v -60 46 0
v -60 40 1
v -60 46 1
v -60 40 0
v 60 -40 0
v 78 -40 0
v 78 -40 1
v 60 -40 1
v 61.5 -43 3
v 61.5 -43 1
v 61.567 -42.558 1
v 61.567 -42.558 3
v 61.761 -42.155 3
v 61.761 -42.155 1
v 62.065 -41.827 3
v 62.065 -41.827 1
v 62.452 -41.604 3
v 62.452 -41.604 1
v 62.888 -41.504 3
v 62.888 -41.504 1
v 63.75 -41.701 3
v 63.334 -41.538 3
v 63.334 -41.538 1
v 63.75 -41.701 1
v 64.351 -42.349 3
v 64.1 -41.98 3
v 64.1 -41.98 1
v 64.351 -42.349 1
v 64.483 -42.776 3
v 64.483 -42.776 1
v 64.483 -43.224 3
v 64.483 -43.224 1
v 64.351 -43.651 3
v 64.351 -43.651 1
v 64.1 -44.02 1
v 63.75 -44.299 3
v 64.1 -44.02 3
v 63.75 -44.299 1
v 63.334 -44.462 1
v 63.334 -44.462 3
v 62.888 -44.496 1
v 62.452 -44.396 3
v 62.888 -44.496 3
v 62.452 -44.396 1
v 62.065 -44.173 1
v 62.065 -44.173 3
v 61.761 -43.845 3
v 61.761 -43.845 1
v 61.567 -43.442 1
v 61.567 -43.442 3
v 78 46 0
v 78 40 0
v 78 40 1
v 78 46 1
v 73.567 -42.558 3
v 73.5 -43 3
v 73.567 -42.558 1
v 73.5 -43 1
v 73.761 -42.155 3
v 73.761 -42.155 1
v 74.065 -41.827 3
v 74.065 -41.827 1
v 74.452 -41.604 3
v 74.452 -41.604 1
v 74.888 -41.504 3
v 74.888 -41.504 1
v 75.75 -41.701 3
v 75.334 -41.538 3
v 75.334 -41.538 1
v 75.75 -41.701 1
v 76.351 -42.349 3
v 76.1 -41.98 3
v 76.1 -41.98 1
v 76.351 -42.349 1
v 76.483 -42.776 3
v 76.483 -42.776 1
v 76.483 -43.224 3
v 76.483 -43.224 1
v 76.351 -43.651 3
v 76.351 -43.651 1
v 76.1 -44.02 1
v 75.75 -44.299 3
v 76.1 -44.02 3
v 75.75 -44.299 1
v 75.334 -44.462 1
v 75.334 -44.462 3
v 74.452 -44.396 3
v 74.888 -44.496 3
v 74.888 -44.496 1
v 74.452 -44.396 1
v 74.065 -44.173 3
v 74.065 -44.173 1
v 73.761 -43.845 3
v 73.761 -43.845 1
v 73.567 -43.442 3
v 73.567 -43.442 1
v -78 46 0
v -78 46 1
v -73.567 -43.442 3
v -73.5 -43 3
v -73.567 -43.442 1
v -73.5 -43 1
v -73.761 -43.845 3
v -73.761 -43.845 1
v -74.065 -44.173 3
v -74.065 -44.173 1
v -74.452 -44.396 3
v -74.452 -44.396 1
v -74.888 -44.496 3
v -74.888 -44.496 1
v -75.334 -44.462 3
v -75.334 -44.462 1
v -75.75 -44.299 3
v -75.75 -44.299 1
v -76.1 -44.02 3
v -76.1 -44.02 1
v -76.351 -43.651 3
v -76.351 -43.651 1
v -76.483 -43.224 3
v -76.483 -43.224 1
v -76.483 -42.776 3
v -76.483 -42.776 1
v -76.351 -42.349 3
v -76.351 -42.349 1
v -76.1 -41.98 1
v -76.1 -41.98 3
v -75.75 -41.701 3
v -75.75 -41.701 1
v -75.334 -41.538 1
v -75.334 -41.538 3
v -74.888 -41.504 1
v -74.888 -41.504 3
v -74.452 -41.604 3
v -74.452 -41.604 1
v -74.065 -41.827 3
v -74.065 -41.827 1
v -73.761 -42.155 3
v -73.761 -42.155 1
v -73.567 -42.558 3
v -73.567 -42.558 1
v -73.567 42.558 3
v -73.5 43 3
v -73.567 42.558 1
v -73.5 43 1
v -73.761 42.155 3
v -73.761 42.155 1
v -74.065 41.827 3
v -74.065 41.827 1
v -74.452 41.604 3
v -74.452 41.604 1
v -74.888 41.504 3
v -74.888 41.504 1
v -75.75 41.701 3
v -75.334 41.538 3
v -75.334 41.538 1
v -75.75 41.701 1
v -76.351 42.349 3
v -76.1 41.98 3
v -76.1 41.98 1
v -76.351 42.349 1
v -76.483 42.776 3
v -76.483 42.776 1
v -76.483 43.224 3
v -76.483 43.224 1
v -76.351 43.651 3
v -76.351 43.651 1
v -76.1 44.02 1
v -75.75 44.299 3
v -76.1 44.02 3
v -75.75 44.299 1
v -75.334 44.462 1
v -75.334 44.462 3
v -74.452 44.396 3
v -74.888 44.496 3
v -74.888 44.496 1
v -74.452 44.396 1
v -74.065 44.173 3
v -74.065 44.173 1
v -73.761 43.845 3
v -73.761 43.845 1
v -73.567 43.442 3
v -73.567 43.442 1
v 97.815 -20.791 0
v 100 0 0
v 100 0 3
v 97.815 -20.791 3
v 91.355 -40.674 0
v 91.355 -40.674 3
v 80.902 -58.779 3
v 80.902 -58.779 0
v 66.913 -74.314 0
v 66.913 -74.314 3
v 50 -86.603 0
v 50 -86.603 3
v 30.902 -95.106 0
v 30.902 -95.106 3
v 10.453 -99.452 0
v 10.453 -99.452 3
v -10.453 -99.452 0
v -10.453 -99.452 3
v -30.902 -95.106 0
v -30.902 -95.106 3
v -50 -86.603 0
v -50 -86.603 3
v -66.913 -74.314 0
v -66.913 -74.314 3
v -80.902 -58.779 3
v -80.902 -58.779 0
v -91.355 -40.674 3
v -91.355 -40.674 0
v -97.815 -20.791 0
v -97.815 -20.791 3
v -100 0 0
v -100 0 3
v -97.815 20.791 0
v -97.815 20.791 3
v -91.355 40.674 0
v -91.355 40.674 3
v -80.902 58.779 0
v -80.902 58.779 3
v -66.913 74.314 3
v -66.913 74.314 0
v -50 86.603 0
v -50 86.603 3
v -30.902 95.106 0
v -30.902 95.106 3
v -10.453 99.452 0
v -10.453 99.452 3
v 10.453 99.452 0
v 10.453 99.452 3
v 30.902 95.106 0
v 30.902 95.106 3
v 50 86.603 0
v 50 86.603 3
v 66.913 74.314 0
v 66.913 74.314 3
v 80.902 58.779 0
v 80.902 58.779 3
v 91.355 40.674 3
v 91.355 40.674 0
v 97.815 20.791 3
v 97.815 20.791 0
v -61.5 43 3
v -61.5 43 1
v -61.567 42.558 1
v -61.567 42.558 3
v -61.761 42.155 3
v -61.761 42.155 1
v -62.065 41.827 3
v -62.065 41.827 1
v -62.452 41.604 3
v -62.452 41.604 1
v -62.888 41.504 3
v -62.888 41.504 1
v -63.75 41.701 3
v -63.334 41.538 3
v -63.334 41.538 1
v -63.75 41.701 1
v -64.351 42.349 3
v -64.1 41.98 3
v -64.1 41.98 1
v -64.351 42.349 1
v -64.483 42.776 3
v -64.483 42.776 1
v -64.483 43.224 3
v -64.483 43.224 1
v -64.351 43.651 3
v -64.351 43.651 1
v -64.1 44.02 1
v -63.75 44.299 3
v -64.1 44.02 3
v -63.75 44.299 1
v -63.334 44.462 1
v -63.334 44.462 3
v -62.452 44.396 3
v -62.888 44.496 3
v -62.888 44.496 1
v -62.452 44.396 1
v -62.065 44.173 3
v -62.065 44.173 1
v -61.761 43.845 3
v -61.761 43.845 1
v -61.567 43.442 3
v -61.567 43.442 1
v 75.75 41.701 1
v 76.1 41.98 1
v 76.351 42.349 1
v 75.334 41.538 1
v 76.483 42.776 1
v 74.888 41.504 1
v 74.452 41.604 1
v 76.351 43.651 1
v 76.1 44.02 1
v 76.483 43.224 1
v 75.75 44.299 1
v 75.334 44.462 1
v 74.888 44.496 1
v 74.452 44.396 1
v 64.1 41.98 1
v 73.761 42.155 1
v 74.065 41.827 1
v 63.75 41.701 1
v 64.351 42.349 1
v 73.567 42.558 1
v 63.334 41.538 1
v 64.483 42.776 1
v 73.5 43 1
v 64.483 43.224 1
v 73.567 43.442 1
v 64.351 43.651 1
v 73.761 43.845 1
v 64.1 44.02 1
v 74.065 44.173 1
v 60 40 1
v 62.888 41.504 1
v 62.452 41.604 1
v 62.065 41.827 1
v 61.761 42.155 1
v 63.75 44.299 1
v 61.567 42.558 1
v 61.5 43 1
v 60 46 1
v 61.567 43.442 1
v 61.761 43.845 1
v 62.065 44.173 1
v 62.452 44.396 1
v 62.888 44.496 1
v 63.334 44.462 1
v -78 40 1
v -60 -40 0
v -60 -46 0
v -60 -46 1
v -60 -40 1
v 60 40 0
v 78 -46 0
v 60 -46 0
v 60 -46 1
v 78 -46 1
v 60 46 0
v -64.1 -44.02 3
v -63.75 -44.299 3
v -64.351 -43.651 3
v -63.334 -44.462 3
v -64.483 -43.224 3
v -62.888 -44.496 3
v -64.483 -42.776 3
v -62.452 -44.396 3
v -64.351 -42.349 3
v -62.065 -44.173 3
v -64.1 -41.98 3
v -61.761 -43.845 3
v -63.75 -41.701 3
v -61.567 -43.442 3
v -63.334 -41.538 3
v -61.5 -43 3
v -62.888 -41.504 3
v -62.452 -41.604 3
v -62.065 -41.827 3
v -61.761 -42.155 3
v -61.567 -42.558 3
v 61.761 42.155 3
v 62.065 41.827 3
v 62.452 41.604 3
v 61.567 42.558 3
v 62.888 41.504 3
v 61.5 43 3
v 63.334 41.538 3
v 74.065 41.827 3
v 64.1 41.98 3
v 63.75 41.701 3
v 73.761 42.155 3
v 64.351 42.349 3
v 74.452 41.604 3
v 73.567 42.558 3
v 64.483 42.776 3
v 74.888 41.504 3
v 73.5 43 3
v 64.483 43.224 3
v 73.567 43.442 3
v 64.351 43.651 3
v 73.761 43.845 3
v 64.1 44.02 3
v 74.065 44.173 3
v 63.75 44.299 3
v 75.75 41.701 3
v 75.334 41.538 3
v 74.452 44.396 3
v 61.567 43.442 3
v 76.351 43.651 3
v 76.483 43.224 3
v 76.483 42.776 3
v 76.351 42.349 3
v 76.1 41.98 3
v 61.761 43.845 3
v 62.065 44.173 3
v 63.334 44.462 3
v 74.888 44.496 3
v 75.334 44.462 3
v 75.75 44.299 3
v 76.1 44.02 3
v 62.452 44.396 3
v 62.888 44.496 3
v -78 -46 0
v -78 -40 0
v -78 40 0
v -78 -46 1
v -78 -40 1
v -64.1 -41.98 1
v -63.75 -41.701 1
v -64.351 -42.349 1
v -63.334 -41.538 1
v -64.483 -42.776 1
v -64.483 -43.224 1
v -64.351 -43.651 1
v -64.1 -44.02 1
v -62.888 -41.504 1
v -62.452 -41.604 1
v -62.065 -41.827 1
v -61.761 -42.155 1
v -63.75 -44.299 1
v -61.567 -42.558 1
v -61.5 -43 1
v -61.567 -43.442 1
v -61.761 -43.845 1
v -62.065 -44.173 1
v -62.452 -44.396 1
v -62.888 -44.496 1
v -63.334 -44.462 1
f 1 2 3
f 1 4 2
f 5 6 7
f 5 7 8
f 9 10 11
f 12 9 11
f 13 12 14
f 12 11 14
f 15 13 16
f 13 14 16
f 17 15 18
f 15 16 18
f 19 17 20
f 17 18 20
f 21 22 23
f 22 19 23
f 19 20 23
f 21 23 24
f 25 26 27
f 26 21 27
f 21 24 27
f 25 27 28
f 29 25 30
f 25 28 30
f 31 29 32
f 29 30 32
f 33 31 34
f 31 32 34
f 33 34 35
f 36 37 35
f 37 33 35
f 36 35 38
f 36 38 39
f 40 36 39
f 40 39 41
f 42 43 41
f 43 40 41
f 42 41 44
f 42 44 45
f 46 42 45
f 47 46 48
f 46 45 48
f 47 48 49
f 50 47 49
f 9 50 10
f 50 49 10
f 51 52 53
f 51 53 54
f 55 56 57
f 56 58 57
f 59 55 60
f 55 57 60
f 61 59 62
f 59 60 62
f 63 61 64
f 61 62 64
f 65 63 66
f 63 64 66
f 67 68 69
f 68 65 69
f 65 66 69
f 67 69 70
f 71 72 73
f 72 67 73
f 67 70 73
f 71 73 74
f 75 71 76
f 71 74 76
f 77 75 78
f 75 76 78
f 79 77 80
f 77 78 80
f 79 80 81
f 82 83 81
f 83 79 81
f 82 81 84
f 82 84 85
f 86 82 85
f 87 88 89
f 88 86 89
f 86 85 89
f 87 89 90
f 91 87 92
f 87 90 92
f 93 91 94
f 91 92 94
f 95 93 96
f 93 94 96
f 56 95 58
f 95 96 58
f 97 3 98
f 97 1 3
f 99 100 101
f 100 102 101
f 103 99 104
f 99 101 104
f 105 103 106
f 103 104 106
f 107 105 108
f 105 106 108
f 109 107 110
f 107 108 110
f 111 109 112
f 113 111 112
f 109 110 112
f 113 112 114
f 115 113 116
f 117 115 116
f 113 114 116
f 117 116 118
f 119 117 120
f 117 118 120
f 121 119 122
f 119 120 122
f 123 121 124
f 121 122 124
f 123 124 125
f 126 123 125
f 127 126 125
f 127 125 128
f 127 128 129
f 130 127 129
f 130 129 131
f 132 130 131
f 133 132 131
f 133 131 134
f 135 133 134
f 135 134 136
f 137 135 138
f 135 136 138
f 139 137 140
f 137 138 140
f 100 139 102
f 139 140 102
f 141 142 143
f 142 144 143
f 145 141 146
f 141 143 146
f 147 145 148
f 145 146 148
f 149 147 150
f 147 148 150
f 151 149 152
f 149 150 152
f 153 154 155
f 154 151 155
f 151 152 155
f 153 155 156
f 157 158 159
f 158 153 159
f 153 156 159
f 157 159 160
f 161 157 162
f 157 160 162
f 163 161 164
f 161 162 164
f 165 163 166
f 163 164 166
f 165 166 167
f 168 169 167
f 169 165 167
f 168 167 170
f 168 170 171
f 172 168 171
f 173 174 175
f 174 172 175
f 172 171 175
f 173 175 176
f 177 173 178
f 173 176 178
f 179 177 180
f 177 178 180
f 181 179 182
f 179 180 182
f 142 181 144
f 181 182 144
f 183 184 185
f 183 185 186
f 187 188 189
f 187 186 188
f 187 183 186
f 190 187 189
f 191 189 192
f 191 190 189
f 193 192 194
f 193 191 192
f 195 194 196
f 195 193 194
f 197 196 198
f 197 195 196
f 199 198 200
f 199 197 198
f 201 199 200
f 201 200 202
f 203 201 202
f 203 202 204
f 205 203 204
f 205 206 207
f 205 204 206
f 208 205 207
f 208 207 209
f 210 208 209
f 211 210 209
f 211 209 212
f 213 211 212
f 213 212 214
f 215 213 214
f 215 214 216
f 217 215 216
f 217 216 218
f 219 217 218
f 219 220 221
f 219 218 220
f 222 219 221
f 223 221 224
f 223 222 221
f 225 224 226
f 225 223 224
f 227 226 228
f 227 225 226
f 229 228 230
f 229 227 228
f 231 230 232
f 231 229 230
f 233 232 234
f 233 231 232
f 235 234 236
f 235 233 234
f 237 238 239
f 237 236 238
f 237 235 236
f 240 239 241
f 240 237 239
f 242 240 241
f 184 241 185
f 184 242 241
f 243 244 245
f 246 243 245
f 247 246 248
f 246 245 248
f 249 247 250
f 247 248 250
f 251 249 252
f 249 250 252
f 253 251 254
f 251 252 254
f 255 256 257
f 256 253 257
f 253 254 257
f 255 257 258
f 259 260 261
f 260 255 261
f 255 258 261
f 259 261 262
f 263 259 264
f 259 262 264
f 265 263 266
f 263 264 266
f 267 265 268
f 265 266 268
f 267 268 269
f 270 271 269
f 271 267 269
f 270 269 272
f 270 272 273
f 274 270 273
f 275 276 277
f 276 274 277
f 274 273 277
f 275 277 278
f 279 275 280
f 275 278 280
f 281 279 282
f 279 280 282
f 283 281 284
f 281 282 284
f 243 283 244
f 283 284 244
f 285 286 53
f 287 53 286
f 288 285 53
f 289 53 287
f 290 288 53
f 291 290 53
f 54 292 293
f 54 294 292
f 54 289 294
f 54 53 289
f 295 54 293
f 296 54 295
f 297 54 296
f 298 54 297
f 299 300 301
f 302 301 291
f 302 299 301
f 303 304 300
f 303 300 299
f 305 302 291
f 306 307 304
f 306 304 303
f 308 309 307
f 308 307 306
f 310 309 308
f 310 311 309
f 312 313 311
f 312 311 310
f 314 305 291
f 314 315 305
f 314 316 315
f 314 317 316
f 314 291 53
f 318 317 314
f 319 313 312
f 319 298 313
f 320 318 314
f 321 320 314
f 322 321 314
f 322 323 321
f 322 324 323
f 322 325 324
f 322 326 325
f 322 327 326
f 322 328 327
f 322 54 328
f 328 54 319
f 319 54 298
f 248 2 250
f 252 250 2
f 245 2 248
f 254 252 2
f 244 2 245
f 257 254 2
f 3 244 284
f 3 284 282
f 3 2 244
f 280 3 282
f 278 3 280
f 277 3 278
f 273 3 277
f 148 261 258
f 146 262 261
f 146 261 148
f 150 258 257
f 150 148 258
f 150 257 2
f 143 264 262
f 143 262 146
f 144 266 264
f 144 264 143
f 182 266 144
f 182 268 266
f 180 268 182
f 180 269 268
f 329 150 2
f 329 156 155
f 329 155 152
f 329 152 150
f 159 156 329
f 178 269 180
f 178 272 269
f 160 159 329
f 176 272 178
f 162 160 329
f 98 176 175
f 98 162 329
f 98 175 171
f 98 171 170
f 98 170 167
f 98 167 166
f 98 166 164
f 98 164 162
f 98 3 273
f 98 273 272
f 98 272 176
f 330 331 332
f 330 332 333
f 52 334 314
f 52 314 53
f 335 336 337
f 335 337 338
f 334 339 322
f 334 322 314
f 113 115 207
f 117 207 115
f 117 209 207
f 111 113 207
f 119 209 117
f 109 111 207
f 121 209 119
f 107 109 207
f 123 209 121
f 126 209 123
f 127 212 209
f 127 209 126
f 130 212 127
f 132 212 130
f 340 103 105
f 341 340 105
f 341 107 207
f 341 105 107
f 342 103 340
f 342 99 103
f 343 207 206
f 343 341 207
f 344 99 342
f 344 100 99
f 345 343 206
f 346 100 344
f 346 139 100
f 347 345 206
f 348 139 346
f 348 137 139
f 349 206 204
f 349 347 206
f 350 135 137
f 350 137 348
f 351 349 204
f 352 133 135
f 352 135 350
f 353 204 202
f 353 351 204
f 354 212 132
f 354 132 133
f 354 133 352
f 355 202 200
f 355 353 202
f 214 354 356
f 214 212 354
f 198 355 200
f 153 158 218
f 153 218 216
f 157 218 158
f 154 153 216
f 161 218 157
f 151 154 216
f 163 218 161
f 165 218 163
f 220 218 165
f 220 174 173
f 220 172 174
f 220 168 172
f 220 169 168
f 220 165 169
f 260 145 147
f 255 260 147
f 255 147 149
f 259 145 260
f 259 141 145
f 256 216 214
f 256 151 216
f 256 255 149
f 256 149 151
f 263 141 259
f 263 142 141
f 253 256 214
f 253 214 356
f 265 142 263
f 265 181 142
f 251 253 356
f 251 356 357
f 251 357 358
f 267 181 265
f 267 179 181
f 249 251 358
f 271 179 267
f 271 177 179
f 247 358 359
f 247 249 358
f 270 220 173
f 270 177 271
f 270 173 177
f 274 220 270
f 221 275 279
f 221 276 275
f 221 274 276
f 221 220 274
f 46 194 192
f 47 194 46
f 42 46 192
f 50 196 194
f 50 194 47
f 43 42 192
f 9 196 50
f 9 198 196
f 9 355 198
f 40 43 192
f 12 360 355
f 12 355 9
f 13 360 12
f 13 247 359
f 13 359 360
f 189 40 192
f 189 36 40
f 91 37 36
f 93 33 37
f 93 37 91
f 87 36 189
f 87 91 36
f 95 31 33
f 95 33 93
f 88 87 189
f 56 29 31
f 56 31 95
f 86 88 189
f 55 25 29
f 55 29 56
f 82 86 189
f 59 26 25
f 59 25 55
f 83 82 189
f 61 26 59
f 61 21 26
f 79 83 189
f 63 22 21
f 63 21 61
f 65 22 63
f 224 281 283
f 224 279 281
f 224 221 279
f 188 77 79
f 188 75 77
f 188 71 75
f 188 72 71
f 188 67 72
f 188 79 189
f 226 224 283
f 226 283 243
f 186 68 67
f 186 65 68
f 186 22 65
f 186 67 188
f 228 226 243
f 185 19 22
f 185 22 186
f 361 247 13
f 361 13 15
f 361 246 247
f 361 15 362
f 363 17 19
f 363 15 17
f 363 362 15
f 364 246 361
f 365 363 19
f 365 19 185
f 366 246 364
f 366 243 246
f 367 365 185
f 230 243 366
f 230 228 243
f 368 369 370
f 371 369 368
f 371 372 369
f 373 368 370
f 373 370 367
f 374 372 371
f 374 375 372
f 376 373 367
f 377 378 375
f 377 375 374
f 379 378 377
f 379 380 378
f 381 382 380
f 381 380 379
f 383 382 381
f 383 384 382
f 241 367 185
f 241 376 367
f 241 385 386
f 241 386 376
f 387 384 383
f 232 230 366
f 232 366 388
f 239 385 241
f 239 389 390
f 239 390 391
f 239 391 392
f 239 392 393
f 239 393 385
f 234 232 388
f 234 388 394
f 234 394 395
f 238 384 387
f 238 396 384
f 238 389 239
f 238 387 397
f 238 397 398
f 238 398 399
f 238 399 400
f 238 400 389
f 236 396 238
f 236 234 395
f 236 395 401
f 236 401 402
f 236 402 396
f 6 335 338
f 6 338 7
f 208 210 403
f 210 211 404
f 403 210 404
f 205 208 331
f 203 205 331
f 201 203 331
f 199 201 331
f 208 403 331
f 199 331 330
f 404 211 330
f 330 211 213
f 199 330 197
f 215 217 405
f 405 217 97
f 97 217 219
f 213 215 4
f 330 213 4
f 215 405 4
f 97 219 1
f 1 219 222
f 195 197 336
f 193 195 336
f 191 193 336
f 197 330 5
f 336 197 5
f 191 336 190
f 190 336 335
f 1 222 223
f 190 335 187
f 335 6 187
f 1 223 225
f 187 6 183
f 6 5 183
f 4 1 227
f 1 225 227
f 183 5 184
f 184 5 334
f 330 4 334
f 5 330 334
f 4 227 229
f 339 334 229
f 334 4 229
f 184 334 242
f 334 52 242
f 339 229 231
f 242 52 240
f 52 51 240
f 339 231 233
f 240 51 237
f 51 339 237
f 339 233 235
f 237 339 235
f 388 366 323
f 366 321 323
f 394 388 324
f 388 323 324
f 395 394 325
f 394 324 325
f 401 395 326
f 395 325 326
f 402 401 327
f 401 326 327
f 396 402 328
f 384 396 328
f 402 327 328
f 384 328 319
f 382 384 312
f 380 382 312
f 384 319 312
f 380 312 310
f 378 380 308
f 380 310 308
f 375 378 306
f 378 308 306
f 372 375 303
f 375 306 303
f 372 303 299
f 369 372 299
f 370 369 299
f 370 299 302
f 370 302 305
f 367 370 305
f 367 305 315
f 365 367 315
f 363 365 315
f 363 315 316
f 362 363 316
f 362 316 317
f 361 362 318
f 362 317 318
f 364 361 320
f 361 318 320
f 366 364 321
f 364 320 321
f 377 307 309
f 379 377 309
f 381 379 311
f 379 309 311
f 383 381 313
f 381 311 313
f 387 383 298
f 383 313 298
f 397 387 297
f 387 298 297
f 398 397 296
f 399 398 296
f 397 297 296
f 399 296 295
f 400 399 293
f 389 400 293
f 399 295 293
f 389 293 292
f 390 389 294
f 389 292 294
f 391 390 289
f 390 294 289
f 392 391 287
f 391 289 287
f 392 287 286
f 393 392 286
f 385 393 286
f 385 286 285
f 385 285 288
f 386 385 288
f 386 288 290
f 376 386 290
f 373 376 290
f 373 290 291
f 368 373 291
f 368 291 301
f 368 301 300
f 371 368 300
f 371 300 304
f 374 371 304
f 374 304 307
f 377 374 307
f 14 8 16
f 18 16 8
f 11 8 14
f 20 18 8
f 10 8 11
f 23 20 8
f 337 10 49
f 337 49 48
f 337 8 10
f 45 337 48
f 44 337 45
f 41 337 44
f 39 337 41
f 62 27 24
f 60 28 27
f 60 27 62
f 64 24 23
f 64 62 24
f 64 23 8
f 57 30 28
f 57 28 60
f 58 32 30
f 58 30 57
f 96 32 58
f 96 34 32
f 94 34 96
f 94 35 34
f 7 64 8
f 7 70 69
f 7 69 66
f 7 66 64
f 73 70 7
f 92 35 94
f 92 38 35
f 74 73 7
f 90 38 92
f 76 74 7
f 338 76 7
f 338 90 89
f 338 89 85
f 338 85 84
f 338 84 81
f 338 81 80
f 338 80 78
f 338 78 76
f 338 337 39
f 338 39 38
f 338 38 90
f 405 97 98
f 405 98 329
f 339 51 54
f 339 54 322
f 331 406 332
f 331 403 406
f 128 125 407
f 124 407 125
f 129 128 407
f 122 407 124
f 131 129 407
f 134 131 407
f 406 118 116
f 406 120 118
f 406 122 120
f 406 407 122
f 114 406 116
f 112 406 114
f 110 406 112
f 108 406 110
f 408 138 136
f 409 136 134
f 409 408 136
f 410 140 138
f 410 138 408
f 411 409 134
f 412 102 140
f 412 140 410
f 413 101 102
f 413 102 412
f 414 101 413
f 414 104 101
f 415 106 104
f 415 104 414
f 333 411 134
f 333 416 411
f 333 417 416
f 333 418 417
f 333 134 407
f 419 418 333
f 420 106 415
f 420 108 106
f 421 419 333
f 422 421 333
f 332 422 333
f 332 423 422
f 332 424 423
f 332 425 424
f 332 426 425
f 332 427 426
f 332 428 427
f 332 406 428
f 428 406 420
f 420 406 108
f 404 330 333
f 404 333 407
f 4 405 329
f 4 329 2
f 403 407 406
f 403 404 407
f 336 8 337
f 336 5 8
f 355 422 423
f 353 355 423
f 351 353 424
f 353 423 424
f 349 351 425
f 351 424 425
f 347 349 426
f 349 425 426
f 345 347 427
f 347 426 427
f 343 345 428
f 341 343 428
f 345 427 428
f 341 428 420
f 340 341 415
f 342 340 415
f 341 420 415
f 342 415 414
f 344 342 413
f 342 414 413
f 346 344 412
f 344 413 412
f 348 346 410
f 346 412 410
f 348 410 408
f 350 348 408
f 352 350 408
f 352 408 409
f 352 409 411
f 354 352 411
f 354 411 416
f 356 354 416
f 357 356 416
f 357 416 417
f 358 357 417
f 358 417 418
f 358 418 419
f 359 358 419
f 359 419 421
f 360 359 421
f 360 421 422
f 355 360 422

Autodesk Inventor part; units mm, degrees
ref_plane "YZ Plane" through (0, 0, 0) normal (1, 0, 0) x (0, 1, 0)
ref_plane "XZ Plane" through (0, 0, 0) normal (0, 1, 0) x (-1, 0, 0)
ref_plane "XY Plane" through (0, 0, 0) normal (0, 0, 1) x (1, 0, 0)
sketch "Sketch1" plane through (0, 0, 0) normal (0, 0, 1) x (1, 0, 0)
  circle A0 centre (0, 0) radius 100
  dimension "d0" = 200
extrude "Extrusion2" add sketch "Sketch1" along normal blind 3
ref_plane "Work Plane1" through (-33, -35, 0) normal (-1, 0, 0) x (0, 0, 1)
sketch "Sketch33" plane through (0, 0, 0) normal (0, 0, -1) x (-1, 0, 0)
  line L0 (-60, 40) -> (-78, 40)
  line L1 (-78, 40) -> (-78, 46)
  line L2 (-78, 46) -> (-60, 46)
  line L3 (-60, 46) -> (-60, 40)
  point P0 (0, 0)
  dimension "d123" = 18
  dimension "d124" = 6
extrude "Extrusion32" cut sketch "Sketch33" against normal blind 1
mirror "Mirror21" about plane through (0, 0, 0) normal (1, 0, 0) of "Extrusion32"
mirror "Mirror22" about plane through (0, 0, 0) normal (0, 1, 0) of "Extrusion32", "Mirror21"
sketch "Sketch34" plane through (0, 0, 1) normal (0, 0, -1) x (-1, 0, 0)
  circle A0 centre (-75, 43) radius 1.5
  circle A1 centre (-63, 43) radius 1.5
  point P0 (0, 0)
  dimension "d127" = 3
  dimension "d128" = 3
extrude "Extrusion33" cut sketch "Sketch34" against normal up to next
mirror "Mirror23" about plane through (0, 0, 0) normal (1, 0, 0) of "Extrusion33"
mirror "Mirror24" about plane through (0, 0, 0) normal (0, 1, 0) of "Extrusion33", "Mirror23"
properties part number "second floor"
